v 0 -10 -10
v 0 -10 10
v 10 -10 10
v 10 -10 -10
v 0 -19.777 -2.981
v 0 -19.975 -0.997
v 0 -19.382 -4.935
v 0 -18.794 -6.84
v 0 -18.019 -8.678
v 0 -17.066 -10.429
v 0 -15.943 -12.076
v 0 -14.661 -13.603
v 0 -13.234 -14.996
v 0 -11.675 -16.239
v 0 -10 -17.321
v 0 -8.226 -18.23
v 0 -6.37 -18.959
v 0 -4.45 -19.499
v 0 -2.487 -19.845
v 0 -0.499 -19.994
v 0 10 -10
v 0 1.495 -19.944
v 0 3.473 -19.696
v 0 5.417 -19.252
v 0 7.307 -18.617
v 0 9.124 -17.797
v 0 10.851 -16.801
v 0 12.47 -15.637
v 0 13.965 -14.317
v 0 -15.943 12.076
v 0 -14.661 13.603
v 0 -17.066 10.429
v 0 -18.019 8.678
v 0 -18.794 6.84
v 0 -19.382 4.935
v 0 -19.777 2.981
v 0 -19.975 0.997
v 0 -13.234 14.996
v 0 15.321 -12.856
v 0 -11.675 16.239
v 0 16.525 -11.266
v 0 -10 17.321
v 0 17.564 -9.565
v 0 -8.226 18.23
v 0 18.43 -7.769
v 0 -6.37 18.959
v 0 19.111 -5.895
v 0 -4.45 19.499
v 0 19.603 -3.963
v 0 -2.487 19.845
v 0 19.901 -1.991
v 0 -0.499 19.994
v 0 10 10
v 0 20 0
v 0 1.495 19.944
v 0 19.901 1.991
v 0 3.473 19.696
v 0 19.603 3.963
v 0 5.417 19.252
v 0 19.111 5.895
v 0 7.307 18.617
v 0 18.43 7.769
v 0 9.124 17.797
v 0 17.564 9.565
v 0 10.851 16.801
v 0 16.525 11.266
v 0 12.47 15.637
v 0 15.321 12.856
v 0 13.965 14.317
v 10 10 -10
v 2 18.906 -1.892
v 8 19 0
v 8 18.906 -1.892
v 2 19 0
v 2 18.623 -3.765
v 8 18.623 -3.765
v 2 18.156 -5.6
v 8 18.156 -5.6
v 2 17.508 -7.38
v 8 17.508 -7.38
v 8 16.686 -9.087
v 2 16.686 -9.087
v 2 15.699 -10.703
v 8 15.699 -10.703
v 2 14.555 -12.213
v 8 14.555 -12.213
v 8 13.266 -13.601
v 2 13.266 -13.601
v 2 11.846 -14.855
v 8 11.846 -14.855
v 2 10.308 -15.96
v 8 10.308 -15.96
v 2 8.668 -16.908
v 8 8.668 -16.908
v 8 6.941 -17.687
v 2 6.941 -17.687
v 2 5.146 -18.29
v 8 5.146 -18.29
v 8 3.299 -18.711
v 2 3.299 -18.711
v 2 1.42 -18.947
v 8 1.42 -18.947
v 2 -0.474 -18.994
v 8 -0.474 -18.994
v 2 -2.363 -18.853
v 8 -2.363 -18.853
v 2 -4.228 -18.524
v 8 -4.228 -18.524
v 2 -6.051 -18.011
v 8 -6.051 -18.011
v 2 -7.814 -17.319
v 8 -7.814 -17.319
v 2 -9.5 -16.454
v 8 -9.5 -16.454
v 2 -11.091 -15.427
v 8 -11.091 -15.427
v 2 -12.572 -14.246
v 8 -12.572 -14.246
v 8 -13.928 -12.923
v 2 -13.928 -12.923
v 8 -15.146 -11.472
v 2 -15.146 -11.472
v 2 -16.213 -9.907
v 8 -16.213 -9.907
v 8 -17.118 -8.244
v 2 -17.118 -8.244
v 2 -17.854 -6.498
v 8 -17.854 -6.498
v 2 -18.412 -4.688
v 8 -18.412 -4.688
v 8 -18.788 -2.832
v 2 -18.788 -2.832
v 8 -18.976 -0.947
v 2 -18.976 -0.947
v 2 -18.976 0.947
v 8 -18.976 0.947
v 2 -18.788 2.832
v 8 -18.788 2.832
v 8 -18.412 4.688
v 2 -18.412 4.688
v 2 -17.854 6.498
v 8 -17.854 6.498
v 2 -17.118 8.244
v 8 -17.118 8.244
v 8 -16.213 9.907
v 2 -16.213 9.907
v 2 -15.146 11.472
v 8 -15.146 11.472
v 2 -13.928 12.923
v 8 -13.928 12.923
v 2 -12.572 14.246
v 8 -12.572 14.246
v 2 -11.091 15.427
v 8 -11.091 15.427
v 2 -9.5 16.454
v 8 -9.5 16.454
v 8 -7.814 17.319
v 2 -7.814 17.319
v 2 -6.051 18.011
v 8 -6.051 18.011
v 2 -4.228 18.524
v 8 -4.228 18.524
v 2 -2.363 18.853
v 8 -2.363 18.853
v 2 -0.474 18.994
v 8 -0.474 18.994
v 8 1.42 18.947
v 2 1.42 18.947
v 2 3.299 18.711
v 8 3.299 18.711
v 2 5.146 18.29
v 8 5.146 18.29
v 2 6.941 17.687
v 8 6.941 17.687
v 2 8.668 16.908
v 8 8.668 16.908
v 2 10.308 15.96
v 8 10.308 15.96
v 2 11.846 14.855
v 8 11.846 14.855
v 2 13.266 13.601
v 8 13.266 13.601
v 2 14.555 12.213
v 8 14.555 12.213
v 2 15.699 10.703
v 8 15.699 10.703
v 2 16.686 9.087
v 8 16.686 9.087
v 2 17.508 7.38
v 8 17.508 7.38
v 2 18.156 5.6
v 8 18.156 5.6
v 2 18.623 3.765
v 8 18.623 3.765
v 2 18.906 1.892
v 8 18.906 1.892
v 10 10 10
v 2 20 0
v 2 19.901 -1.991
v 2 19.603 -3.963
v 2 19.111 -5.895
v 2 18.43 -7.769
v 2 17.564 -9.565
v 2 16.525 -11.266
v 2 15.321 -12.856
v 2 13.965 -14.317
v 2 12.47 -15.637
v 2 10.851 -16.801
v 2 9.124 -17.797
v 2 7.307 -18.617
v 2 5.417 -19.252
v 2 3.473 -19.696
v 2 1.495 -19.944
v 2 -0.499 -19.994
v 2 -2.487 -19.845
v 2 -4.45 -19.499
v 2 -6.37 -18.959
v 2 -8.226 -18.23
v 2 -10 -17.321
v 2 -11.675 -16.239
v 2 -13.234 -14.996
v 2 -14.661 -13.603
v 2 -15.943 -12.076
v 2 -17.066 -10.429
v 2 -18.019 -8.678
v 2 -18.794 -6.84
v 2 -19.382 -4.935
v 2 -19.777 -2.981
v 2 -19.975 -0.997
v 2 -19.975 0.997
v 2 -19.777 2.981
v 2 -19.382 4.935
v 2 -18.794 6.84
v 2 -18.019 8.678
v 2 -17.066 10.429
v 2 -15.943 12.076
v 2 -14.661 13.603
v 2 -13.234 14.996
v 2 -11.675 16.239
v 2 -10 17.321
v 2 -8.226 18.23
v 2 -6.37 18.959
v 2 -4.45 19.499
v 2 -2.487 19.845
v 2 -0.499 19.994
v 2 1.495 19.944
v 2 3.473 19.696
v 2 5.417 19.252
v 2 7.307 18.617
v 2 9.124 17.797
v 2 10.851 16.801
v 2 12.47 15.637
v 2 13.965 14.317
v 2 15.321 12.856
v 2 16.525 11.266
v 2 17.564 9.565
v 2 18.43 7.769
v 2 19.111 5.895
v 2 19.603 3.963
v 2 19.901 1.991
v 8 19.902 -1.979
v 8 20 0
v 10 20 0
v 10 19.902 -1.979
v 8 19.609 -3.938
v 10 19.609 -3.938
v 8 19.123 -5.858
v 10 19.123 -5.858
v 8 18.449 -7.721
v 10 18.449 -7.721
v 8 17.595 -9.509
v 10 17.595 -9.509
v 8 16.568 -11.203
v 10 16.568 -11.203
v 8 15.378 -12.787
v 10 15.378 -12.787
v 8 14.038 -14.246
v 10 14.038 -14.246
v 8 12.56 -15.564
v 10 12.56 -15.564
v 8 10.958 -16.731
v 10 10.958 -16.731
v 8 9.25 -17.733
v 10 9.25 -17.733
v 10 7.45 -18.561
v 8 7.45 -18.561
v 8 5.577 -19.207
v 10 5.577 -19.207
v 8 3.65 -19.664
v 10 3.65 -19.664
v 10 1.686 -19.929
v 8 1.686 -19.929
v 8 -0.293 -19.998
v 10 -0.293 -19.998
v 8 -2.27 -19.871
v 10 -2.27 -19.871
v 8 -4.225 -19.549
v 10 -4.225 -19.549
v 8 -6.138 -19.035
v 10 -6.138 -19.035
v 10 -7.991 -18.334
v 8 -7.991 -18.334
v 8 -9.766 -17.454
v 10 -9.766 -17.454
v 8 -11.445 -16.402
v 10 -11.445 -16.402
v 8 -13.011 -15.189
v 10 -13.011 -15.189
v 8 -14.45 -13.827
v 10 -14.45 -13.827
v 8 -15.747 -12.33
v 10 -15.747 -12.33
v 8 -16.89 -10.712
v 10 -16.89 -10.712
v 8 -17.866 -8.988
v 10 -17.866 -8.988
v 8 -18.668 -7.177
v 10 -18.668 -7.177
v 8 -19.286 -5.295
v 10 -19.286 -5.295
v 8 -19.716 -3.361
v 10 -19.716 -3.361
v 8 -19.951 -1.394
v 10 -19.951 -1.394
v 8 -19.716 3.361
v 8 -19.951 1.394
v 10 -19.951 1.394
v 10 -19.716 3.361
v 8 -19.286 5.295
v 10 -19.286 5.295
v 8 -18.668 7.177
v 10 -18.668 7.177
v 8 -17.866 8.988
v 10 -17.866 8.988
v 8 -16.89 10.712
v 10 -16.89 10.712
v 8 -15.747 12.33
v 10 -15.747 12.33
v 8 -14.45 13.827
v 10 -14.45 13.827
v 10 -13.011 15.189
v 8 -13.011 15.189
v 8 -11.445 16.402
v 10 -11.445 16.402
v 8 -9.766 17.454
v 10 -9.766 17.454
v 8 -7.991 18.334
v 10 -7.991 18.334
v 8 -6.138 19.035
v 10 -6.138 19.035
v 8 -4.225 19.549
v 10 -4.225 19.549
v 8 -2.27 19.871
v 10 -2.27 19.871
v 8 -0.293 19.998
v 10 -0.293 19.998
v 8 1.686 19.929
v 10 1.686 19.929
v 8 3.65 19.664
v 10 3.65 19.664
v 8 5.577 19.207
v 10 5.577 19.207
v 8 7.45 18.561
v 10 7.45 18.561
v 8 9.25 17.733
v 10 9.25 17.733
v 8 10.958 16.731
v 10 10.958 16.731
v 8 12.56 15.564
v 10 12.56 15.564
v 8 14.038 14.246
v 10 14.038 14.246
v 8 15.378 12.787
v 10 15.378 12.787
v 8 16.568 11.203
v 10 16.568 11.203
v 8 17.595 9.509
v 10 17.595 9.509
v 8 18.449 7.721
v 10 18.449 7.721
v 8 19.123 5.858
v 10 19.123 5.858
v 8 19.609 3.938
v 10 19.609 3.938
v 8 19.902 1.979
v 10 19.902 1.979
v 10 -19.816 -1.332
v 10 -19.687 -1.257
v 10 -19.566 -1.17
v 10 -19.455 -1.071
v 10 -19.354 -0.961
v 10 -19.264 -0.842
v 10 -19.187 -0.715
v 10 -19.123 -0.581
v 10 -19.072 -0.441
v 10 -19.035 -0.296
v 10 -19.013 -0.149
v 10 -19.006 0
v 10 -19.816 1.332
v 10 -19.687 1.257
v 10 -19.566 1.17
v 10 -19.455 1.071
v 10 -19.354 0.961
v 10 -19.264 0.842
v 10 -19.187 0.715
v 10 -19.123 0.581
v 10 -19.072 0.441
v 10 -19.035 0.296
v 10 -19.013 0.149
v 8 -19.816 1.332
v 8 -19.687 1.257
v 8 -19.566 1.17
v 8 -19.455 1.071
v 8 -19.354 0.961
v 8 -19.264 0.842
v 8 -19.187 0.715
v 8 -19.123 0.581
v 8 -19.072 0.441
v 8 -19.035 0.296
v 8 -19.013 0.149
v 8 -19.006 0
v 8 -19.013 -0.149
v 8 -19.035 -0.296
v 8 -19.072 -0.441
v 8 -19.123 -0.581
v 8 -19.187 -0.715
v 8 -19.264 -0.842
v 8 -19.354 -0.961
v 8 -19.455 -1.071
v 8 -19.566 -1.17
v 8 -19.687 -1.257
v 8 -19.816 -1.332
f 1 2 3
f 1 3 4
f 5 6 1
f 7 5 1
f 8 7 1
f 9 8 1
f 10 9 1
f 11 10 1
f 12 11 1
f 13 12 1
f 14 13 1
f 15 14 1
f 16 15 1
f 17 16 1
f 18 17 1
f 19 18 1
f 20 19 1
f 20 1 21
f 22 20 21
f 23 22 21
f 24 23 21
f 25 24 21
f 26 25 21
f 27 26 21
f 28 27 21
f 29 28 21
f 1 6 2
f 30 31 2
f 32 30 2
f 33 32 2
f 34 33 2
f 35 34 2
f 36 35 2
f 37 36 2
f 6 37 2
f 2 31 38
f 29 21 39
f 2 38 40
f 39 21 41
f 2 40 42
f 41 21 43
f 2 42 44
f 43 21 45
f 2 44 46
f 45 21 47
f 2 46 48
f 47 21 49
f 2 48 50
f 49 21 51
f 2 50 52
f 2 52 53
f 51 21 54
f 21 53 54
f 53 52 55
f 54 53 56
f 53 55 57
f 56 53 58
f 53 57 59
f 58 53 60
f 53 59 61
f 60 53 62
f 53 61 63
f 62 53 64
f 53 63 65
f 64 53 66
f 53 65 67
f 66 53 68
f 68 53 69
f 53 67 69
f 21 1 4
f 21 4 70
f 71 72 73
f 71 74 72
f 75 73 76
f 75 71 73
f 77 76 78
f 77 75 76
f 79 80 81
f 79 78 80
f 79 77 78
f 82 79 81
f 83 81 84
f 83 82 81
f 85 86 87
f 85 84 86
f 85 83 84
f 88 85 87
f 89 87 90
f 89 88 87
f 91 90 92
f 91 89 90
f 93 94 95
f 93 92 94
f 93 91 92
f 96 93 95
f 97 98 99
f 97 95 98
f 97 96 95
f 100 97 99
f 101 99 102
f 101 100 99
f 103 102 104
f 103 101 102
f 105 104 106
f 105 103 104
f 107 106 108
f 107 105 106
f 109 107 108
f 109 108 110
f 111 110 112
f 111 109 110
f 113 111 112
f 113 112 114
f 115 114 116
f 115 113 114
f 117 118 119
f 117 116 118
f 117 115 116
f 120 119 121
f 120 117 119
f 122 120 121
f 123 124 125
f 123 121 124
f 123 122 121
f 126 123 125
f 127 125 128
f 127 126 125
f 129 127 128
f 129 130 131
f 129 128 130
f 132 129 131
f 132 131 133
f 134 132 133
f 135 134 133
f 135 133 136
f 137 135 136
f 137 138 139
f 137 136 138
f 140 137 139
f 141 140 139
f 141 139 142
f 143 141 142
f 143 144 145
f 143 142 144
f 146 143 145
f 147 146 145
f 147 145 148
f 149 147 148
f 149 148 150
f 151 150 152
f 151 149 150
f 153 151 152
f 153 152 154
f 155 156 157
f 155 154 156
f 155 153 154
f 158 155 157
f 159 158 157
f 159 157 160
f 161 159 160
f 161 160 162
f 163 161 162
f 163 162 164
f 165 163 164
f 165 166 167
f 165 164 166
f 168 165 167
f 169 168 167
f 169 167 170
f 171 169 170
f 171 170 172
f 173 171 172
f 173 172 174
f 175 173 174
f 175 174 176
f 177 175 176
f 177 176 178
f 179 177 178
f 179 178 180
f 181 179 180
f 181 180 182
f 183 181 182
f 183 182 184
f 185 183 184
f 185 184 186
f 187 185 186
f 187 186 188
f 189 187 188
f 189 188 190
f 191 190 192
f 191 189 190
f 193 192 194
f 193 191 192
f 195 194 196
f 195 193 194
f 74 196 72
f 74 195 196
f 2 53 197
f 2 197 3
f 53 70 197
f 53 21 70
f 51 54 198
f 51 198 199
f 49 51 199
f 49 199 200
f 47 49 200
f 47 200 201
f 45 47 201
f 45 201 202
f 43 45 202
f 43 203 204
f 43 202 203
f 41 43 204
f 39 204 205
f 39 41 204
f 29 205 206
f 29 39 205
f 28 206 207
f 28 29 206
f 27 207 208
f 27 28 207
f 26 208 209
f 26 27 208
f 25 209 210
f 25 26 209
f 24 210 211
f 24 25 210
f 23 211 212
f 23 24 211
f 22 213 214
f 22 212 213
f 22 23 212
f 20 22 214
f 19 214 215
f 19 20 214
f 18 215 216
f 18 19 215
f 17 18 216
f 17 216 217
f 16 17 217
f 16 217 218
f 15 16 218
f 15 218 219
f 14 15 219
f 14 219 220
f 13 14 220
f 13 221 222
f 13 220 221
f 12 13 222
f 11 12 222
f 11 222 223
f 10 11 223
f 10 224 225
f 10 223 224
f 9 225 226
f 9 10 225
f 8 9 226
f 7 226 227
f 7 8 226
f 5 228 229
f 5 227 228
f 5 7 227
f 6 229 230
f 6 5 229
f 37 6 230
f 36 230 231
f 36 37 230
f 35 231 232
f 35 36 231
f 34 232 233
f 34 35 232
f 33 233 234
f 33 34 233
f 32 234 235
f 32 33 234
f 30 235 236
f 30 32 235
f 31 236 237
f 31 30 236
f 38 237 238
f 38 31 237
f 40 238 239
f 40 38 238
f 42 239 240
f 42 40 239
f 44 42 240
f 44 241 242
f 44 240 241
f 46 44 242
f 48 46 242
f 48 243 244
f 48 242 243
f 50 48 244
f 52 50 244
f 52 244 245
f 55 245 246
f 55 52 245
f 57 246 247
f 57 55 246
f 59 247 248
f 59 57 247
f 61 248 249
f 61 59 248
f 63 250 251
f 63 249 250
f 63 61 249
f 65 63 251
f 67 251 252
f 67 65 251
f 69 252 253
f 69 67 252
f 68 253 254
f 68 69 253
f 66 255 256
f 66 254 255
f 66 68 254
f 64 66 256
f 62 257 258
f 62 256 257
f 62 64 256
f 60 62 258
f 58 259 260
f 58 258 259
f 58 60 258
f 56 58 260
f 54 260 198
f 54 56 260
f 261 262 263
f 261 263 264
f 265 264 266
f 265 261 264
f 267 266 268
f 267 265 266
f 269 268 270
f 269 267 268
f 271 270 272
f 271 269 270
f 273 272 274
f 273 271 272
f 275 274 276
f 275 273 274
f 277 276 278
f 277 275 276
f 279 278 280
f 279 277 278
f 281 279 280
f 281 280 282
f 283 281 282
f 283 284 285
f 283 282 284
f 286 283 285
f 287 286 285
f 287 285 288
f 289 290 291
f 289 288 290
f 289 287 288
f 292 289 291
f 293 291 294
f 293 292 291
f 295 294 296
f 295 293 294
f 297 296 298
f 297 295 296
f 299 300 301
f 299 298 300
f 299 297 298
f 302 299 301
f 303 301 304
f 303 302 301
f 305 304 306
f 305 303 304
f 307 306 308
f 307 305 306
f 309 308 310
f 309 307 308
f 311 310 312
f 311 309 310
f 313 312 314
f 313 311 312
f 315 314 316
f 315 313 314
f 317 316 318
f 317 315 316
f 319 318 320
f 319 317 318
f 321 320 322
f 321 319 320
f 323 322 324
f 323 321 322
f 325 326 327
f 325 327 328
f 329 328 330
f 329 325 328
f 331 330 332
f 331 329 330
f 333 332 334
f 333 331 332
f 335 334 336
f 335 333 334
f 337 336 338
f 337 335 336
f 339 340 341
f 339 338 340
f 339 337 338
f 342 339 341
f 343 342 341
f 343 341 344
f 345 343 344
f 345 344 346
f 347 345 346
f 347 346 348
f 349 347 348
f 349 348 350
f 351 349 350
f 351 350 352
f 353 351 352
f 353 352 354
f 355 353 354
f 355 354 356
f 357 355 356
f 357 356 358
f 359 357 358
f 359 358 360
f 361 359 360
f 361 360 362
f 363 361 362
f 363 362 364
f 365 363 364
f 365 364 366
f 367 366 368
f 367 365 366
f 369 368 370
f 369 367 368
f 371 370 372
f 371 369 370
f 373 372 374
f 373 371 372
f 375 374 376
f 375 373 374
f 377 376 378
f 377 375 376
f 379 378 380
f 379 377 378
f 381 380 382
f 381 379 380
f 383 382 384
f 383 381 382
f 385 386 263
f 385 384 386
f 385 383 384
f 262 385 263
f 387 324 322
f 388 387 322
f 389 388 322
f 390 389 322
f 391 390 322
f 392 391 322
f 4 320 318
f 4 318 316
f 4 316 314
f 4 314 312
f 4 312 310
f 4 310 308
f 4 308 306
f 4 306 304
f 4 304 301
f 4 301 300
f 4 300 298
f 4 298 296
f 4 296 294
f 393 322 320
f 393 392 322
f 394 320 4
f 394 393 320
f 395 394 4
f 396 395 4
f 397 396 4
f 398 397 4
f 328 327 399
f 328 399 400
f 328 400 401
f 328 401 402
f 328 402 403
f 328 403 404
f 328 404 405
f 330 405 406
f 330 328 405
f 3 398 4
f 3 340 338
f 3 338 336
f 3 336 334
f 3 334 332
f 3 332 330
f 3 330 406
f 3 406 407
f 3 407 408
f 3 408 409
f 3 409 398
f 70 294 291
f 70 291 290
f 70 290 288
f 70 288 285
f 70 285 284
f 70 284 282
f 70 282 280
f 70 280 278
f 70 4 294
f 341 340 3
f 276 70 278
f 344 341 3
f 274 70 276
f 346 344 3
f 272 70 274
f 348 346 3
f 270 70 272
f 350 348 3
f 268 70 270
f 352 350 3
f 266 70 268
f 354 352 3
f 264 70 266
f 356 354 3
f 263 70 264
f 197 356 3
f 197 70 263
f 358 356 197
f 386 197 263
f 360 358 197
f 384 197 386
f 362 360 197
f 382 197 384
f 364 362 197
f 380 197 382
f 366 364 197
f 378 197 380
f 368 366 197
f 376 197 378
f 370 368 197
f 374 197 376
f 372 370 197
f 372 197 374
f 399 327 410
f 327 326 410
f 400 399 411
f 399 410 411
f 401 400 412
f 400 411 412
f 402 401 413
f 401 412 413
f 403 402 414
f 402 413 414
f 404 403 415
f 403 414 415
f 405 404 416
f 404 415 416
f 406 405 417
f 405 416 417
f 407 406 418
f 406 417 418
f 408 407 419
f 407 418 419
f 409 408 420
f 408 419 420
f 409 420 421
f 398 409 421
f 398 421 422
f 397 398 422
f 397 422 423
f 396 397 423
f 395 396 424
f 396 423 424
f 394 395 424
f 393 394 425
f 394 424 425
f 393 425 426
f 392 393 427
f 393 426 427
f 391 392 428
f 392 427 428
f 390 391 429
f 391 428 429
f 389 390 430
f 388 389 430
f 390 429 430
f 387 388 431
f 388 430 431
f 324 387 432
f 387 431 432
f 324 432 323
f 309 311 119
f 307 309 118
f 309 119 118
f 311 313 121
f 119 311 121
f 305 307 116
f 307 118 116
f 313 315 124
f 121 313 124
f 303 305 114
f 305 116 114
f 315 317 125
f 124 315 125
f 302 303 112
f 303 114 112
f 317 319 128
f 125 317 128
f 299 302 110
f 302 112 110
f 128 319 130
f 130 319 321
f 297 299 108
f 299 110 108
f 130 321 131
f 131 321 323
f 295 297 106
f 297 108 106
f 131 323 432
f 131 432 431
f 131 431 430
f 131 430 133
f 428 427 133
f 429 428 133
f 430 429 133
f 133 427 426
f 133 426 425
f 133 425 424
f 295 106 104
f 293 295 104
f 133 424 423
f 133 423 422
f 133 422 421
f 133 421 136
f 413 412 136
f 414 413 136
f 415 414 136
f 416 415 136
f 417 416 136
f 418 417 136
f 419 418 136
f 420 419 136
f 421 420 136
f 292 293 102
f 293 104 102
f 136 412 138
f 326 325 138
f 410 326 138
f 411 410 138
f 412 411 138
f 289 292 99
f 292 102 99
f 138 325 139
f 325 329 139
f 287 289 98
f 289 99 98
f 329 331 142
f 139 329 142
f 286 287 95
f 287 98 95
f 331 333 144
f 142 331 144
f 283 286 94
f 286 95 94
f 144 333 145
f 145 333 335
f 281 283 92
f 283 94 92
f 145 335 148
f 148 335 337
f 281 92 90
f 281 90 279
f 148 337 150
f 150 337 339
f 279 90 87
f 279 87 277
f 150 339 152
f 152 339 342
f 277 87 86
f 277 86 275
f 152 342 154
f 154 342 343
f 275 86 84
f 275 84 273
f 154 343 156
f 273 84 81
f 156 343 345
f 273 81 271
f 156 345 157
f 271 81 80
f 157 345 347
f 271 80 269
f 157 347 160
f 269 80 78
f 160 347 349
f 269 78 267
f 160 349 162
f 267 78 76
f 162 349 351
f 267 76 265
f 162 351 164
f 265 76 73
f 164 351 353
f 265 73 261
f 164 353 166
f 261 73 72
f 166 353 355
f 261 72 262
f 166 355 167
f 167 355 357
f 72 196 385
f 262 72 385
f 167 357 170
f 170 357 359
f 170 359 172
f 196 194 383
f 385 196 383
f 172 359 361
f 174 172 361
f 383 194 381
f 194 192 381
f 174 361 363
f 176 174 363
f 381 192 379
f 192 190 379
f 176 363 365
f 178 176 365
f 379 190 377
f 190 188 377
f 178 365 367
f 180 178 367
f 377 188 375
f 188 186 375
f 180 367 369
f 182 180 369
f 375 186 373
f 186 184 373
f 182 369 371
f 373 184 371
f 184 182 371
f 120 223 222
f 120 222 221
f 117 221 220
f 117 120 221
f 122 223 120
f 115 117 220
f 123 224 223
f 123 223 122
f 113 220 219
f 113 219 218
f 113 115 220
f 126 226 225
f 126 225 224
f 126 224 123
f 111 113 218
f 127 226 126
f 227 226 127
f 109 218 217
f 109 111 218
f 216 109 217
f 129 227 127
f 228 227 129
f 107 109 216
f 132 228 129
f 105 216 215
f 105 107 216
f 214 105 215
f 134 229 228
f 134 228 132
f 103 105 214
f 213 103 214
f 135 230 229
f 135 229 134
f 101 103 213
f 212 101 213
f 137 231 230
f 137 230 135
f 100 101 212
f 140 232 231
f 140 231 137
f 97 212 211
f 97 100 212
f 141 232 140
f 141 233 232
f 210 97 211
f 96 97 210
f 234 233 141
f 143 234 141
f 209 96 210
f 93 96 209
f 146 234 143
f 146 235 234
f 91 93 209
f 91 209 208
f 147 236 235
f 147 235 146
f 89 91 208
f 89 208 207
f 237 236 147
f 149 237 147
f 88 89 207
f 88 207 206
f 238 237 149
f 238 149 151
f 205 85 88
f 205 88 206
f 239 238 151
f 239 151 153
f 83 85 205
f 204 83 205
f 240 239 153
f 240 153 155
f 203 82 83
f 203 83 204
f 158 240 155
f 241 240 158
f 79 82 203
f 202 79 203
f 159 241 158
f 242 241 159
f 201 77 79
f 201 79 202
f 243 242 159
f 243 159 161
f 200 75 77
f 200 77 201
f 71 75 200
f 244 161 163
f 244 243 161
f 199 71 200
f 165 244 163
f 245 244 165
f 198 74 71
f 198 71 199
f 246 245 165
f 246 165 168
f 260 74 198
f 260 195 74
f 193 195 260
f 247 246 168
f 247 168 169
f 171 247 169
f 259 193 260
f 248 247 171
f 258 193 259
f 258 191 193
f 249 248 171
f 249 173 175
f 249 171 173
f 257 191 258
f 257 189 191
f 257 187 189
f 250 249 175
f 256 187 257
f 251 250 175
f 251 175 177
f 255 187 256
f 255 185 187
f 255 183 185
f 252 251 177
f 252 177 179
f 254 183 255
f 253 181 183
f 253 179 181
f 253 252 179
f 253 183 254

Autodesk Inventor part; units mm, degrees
ref_plane "YZ Plane" through (0, 0, 0) normal (1, 0, 0) x (0, 1, 0)
ref_plane "XZ Plane" through (0, 0, 0) normal (0, 1, 0) x (-1, 0, 0)
sketch "Sketch1" plane through (0, 0, 0) normal (1, 0, 0) x (0, 1, 0)
  line L0 (10, 10) -> (-10, 10)
  line L1 (-10, 10) -> (-10, -10)
  line L2 (-10, -10) -> (10, -10)
  line L3 (10, -10) -> (10, 10)
  line L4 (10, 10) -> (-10, -10) construction
  line L5 (-10, 10) -> (10, -10) construction
  circle A0 centre (0, 0) radius 14.1421
  circle A1 centre (0, 0) radius 20
  dimension "d0" = 20
  dimension "d1" = 20
  dimension "d2" = 40
extrude "Extrusion1" add sketch "Sketch1" along normal blind 10 contours A0 L3 | L0 A0 | L1 A0 | A0 L2 | A1
ref_plane "Work Plane1" through (0, -10, 0) normal (0, 0, -1) x (-1, 0, 0)
sketch "Sketch2" plane through (0, -10, 0) normal (0, 0, -1) x (-1, 0, 0)
  line L0 (0, 30) -> (-10, 30) projected
  line L1 (0, 30) -> (-5, 30)
  line L2 (-5, 30) -> (-2, 30)
  line L3 (-5, 30) -> (-8, 30)
  line L4 (-8, 30) -> (-8, 29)
  line L5 (-8, 29) -> (-3, 29)
  line L6 (-8, 29) -> (-2, 29)
  line L7 (-2, 29) -> (-2, 30)
  line L8 (-2, 30) -> (-8, 30)
  line L9 (-8, 30) -> (-8, 29)
  line L10 (2, 10) -> (-12, 10) projected
  point P0 (0, 10)
  point P1 (-2.5, 28)
  dimension "d5" = 3
  dimension "d6" = 3
  dimension "d7" = 1
revolve "Revolution1" cut sketch "Sketch2" angle 360 about axis through (-10, 0, 0) along (1, 0, 0)
sketch "Sketch4" plane through (8, 0, 0) normal (-1, 0, 0) x (0, 0, 1)
  line L0 (0, -19.0057) -> (0, -20.5057)
  circle A0 centre (0, -20.5057) radius 1.5
  point P0 (0, 0)
  dimension "d12" = 1.5
extrude "Extrusion3" cut sketch "Sketch4" against normal blind 10
properties part number "antenna_rad" material "PET Plastic"
